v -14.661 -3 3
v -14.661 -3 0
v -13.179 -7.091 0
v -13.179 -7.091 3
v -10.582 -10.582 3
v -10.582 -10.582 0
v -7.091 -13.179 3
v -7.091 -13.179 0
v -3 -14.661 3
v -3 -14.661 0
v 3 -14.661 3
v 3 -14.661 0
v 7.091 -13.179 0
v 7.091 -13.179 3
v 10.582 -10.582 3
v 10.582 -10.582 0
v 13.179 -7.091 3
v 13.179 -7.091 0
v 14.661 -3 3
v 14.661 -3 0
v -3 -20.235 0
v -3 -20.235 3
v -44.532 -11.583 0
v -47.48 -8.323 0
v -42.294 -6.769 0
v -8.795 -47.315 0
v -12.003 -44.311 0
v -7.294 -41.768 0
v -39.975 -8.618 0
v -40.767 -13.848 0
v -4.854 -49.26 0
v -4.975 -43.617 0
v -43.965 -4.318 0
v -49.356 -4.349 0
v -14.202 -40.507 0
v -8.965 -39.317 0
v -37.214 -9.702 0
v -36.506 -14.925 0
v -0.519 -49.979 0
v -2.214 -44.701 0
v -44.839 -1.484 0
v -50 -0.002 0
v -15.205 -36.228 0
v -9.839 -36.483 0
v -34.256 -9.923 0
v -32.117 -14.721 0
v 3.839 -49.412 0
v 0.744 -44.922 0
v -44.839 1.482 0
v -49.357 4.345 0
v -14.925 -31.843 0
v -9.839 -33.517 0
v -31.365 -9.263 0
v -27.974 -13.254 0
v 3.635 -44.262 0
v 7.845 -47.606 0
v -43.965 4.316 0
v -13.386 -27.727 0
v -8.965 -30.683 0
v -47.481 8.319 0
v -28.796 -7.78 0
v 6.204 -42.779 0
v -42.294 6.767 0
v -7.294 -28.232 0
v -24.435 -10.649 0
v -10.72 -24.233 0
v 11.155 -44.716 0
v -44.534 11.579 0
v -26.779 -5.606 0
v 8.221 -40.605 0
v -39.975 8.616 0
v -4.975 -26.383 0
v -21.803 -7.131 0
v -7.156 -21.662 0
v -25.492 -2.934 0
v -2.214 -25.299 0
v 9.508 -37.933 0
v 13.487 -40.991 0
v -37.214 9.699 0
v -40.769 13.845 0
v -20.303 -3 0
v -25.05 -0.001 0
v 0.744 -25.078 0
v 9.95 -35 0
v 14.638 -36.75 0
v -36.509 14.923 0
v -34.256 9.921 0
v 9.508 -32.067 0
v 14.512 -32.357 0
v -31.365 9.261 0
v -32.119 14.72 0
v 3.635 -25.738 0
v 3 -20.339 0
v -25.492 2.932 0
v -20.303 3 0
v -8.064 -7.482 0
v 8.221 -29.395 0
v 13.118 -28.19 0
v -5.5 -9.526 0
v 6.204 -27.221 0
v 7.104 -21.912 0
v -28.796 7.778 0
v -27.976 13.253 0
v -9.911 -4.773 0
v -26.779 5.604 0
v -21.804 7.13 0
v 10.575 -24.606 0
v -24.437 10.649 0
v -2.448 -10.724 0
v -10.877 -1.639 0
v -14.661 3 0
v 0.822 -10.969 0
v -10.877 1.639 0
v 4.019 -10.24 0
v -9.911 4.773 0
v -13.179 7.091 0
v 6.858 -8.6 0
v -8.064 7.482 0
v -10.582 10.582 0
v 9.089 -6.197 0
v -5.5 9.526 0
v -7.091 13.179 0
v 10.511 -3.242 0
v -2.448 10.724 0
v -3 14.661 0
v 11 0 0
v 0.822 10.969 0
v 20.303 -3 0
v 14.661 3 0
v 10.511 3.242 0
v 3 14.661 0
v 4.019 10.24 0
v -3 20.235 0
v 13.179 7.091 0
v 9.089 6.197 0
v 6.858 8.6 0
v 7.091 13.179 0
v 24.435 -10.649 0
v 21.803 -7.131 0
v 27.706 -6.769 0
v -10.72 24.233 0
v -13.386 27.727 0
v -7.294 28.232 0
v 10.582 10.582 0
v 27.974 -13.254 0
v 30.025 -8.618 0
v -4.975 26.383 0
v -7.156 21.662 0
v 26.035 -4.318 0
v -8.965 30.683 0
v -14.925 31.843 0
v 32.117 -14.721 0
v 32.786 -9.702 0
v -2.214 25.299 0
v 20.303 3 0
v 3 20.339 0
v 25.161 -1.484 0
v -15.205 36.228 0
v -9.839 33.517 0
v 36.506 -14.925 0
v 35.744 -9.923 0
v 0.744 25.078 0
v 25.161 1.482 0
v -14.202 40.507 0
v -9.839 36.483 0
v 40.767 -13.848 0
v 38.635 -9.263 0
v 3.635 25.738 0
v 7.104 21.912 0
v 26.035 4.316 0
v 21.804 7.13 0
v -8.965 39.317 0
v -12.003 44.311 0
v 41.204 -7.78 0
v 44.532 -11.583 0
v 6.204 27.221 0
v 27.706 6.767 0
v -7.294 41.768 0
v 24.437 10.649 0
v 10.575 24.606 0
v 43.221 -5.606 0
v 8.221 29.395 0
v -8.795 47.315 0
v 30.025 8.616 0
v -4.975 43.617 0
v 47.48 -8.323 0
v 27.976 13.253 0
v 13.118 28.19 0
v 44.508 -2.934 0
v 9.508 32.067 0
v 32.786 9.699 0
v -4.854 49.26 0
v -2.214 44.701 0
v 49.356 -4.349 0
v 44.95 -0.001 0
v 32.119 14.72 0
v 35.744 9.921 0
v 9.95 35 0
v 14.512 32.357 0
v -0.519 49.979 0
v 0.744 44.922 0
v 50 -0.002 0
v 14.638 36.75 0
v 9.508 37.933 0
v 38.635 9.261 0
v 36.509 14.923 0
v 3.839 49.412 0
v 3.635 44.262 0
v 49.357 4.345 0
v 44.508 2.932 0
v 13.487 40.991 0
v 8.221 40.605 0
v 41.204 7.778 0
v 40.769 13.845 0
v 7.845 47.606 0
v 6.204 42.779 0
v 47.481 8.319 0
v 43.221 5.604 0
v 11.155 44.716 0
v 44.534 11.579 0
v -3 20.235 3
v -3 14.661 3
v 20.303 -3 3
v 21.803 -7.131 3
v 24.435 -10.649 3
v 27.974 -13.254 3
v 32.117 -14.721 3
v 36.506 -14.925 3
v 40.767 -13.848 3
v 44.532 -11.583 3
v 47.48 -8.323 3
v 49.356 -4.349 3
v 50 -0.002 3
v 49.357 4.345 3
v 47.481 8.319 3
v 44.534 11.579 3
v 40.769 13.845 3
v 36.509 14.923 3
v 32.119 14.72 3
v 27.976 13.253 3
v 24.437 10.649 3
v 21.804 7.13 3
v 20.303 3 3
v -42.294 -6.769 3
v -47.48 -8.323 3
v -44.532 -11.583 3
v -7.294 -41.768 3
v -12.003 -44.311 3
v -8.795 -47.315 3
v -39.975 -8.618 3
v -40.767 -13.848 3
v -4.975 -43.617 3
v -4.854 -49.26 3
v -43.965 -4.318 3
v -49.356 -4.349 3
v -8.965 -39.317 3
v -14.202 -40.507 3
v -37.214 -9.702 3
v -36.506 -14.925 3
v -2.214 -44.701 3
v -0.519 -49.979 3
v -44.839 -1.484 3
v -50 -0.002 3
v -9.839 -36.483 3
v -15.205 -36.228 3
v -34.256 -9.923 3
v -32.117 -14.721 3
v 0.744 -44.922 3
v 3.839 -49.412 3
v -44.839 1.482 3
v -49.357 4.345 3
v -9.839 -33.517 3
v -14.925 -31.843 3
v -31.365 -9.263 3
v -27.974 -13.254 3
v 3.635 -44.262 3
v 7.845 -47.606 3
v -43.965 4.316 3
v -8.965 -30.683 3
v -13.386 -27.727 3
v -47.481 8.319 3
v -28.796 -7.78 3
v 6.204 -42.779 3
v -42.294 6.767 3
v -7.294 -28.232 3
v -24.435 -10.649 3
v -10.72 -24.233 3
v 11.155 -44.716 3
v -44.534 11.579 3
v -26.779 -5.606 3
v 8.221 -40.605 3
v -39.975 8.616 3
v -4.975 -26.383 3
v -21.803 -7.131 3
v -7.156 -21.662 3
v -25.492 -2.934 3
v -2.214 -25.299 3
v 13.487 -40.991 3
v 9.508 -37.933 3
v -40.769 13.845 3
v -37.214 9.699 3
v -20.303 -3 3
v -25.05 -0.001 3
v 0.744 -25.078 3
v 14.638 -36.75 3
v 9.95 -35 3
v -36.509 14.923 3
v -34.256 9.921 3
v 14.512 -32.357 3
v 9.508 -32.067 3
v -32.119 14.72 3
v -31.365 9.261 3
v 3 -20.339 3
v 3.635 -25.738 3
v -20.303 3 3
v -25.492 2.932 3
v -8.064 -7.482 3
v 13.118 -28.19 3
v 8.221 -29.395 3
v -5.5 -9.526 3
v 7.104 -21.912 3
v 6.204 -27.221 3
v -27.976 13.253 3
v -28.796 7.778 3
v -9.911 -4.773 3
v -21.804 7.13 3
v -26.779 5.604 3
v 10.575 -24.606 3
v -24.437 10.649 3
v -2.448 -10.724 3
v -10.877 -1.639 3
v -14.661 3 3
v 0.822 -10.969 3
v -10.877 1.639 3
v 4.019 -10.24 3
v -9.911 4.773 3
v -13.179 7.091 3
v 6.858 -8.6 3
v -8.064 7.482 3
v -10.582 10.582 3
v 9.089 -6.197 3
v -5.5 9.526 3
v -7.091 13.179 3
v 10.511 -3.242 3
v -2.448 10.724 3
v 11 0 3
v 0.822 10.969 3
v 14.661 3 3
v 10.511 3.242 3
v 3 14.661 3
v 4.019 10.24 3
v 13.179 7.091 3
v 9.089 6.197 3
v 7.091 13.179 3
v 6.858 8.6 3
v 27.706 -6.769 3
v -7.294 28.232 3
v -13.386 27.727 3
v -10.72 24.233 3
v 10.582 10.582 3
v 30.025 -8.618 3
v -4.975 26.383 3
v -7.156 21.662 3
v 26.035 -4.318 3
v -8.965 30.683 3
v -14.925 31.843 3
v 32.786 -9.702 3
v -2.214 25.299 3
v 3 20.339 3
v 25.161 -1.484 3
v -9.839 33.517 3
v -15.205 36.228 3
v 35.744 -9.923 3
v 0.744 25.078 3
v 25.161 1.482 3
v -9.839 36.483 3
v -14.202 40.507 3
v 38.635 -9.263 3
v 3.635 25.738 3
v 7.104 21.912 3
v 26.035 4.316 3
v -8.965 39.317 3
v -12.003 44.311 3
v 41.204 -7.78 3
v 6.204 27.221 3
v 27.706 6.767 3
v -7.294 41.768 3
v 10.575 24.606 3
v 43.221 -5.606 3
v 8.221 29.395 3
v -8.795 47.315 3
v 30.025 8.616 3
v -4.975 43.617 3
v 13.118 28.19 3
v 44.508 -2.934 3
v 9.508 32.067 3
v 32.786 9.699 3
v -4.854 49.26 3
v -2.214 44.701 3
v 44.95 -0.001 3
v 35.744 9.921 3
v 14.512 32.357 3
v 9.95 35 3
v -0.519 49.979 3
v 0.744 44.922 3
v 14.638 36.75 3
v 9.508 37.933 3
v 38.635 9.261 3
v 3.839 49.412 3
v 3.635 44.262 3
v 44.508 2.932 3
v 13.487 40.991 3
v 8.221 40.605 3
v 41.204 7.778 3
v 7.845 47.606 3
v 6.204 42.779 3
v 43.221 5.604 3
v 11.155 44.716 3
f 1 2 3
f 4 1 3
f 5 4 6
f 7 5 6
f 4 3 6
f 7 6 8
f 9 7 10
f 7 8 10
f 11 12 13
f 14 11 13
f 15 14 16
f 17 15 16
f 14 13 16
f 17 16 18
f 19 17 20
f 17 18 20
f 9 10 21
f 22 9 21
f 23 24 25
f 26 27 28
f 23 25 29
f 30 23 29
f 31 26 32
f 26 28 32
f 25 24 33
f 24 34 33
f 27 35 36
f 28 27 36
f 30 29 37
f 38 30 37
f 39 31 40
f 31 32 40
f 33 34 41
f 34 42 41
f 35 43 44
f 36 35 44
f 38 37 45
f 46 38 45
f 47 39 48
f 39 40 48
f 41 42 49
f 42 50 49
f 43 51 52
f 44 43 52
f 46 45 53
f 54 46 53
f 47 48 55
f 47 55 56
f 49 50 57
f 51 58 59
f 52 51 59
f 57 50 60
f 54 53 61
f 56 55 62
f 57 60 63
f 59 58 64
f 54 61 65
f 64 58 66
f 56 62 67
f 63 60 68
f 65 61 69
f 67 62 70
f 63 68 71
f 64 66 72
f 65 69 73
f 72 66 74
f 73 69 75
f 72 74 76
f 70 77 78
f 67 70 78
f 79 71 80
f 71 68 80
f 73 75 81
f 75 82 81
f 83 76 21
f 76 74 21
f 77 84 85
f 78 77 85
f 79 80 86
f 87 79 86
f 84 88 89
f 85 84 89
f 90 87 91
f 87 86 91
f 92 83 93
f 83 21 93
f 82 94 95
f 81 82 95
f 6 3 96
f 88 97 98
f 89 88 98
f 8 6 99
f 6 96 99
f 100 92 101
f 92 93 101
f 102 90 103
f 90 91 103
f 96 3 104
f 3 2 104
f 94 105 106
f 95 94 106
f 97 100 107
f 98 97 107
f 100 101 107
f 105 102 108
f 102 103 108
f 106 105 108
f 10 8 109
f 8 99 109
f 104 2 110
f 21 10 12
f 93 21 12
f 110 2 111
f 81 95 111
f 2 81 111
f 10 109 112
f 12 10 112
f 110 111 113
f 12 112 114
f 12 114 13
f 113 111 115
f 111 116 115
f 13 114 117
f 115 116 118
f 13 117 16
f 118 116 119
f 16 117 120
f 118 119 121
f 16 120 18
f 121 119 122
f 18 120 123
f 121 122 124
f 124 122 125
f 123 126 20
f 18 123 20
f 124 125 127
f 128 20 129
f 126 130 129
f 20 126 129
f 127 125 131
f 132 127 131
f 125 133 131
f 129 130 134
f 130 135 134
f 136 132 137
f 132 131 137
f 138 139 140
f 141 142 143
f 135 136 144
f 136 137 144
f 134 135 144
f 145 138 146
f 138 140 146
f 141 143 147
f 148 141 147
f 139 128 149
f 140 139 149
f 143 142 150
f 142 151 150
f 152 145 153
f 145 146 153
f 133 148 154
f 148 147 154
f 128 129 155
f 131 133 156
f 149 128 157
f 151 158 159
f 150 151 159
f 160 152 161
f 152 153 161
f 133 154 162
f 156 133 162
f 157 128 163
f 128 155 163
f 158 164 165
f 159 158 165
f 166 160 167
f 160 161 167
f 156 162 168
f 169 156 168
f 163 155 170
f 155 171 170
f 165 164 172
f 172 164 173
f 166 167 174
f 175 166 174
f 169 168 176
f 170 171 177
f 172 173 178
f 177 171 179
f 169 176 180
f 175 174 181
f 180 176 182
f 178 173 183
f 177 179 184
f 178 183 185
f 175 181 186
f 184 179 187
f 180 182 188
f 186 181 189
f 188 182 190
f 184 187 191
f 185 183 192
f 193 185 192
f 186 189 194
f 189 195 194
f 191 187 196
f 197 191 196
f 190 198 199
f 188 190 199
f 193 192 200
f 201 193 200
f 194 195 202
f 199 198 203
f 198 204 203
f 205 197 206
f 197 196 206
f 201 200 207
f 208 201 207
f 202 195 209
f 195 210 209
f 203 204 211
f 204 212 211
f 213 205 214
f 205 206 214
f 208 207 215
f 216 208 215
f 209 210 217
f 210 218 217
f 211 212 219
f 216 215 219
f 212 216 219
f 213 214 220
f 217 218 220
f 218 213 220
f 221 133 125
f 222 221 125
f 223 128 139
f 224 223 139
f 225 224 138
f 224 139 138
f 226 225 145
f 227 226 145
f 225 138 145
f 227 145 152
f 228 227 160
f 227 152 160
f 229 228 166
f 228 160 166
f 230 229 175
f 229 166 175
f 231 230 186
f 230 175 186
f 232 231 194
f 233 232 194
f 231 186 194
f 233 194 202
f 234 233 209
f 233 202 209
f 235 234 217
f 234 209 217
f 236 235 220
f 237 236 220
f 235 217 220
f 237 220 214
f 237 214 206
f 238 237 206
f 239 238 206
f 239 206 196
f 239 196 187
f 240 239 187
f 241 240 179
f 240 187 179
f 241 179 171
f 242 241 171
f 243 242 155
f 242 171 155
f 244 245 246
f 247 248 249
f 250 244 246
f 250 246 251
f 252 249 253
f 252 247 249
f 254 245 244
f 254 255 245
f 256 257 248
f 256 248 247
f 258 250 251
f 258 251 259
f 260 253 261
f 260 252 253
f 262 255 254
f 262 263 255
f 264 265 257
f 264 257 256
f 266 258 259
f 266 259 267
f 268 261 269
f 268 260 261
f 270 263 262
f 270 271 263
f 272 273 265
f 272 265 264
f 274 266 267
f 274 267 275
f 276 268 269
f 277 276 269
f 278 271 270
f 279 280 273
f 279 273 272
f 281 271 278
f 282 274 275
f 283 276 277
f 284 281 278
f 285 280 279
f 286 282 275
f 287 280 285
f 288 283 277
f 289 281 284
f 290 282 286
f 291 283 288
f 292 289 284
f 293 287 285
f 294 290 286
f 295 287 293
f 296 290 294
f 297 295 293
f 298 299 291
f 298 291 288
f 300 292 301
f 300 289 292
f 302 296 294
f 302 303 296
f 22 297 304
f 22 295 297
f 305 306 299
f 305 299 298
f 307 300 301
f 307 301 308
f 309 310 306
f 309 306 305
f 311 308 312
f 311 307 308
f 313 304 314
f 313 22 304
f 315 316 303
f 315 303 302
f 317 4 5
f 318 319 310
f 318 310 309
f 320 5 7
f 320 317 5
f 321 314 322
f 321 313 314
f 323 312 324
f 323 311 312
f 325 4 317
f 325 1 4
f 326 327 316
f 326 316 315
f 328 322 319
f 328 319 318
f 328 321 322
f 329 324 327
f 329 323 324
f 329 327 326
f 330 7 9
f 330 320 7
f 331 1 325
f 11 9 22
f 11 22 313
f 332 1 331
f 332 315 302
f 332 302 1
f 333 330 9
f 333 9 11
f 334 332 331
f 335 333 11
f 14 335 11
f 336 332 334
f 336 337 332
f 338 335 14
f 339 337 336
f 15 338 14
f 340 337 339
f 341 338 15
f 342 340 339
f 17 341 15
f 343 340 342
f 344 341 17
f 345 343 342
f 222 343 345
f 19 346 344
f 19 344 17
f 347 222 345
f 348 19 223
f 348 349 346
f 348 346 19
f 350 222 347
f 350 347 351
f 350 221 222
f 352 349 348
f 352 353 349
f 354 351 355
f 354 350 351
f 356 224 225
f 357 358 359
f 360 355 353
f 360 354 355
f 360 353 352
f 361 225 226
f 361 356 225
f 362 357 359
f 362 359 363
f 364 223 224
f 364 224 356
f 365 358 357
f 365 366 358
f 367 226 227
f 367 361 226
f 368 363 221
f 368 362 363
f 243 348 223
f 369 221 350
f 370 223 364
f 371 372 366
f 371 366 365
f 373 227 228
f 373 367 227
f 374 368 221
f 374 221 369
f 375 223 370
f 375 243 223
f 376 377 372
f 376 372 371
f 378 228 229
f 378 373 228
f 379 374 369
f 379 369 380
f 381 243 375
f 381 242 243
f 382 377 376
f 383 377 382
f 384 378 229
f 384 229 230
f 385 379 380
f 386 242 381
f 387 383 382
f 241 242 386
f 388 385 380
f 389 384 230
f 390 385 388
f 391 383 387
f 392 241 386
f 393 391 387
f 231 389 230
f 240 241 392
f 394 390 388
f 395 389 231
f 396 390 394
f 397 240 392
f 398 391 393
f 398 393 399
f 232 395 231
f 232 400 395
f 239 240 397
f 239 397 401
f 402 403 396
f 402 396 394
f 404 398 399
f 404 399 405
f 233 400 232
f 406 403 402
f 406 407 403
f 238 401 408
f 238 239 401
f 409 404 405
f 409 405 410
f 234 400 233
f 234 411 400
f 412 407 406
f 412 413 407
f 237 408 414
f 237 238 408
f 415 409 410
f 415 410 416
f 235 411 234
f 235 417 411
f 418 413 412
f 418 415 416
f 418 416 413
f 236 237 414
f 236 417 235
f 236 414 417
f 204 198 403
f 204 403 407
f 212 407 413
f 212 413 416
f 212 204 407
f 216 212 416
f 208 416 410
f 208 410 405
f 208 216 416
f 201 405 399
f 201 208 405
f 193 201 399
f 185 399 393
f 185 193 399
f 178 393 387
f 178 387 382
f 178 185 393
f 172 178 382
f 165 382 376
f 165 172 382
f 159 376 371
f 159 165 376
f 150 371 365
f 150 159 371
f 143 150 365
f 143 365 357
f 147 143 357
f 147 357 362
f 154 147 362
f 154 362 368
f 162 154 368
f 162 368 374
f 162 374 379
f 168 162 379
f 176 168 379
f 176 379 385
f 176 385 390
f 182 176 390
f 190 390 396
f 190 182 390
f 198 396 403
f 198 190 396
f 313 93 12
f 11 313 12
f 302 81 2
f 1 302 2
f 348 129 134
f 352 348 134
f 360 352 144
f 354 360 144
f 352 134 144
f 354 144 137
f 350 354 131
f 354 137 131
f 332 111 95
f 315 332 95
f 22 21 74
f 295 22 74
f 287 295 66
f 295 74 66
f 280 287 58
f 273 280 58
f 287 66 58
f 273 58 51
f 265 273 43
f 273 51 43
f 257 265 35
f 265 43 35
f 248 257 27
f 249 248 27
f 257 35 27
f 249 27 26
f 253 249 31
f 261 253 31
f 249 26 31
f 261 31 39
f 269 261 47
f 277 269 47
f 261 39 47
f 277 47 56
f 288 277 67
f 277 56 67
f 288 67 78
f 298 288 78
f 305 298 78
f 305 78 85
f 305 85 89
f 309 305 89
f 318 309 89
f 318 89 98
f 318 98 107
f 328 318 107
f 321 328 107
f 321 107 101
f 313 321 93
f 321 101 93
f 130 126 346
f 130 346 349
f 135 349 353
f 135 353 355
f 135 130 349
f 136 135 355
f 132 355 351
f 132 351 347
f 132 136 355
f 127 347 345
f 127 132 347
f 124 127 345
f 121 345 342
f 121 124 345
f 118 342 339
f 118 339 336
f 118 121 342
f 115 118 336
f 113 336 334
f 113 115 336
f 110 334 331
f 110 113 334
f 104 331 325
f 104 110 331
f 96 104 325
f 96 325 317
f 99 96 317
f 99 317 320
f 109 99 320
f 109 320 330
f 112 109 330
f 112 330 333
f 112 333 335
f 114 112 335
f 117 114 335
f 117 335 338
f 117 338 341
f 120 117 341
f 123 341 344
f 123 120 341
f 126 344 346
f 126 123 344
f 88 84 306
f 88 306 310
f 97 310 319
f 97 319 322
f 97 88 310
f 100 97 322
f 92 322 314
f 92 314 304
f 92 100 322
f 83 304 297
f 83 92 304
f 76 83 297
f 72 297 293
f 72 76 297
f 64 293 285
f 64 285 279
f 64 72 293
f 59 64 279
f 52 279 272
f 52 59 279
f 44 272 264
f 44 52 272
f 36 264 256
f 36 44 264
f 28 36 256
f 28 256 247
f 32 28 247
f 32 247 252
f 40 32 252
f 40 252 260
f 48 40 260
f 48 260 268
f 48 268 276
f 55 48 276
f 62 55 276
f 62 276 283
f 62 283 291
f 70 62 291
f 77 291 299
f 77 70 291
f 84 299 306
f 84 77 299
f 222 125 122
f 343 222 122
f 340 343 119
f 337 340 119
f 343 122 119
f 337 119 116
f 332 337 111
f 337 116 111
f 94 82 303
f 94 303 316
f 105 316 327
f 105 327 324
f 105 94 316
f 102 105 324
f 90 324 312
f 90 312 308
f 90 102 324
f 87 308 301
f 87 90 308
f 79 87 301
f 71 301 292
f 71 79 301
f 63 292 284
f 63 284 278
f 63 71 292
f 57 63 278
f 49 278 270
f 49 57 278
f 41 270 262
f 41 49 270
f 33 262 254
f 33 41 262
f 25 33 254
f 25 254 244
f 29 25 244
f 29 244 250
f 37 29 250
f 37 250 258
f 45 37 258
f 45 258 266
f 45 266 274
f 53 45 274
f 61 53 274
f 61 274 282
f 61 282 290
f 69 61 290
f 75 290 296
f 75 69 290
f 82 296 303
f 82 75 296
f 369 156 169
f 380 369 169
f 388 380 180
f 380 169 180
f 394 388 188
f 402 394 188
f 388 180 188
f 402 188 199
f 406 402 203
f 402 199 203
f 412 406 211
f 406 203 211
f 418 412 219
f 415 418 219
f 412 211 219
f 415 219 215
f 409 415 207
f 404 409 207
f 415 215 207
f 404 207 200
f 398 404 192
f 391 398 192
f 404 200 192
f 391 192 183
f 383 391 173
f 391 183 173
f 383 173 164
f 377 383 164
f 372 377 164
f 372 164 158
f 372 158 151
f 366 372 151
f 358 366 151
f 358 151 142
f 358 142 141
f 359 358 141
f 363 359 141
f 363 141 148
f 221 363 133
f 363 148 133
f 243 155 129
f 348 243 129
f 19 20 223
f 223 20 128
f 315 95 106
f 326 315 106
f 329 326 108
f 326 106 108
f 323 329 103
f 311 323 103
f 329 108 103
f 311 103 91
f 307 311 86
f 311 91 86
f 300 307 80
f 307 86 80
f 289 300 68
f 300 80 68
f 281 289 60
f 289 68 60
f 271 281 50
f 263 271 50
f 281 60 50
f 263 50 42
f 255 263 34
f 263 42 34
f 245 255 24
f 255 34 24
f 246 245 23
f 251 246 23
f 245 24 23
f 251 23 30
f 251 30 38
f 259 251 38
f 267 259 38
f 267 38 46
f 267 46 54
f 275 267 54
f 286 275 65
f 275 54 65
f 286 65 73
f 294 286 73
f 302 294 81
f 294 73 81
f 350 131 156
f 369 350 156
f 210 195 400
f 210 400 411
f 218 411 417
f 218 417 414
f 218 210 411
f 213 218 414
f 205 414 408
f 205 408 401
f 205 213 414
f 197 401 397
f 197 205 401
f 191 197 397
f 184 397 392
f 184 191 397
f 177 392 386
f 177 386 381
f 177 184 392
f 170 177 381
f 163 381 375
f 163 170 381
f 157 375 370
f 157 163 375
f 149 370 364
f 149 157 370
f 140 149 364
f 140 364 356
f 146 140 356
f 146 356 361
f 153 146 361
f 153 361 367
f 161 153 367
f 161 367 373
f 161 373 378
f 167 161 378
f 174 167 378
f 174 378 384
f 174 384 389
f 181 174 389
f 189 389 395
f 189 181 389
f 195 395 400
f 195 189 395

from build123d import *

# Parameters (mm, degrees)
F0_R     = 9.95
F0_R_2   = 11
F1_DEPTH = 3


with BuildPart() as f1:
    # F0 (on Top) → F1 (new body)
    with BuildSketch(Plane.XY):
        with BuildLine():
            ThreePointArc((-3, -20.234534), (-0.51911, -49.97929), (3, -20.339432))
            Line((3, -20.339432), (3, -14.661455))
            ThreePointArc((3, -14.661455), (10.582019, -10.582019), (14.661455, -3))
            Line((14.661455, -3), (20.302832, -3))
            ThreePointArc((20.302832, -3), (50, -0.002273), (20.303291, 3))
            Line((20.303291, 3), (14.661455, 3))
            ThreePointArc((14.661455, 3), (10.582019, 10.582019), (3, 14.661455))
            Line((3, 14.661455), (3, 20.339432))
            ThreePointArc((3, 20.339432), (-0.51911, 49.97929), (-3, 20.234534))
            Line((-3, 20.234534), (-3, 14.661455))
            ThreePointArc((-3, 14.661455), (-10.582019, 10.582019), (-14.661455, 3))
            Line((-14.661455, 3), (-20.303291, 3))
            ThreePointArc((-20.303291, 3), (-50, -0.002273), (-20.302832, -3))
            Line((-20.302832, -3), (-14.661455, -3))
            ThreePointArc((-14.661455, -3), (-10.582019, -10.582019), (-3, -14.661455))
            Line((-3, -14.661455), (-3, -20.234534))
        make_face()
        with Locations((-35, -0.001125)):
            Circle(F0_R, mode=Mode.SUBTRACT)
        with Locations((0, -35)):
            Circle(F0_R, mode=Mode.SUBTRACT)
        with Locations((35, -0.001125)):
            Circle(F0_R, mode=Mode.SUBTRACT)
        Circle(F0_R_2, mode=Mode.SUBTRACT)
        with Locations((0, 35)):
            Circle(F0_R, mode=Mode.SUBTRACT)
    extrude(amount=F1_DEPTH)


solid = f1.part
